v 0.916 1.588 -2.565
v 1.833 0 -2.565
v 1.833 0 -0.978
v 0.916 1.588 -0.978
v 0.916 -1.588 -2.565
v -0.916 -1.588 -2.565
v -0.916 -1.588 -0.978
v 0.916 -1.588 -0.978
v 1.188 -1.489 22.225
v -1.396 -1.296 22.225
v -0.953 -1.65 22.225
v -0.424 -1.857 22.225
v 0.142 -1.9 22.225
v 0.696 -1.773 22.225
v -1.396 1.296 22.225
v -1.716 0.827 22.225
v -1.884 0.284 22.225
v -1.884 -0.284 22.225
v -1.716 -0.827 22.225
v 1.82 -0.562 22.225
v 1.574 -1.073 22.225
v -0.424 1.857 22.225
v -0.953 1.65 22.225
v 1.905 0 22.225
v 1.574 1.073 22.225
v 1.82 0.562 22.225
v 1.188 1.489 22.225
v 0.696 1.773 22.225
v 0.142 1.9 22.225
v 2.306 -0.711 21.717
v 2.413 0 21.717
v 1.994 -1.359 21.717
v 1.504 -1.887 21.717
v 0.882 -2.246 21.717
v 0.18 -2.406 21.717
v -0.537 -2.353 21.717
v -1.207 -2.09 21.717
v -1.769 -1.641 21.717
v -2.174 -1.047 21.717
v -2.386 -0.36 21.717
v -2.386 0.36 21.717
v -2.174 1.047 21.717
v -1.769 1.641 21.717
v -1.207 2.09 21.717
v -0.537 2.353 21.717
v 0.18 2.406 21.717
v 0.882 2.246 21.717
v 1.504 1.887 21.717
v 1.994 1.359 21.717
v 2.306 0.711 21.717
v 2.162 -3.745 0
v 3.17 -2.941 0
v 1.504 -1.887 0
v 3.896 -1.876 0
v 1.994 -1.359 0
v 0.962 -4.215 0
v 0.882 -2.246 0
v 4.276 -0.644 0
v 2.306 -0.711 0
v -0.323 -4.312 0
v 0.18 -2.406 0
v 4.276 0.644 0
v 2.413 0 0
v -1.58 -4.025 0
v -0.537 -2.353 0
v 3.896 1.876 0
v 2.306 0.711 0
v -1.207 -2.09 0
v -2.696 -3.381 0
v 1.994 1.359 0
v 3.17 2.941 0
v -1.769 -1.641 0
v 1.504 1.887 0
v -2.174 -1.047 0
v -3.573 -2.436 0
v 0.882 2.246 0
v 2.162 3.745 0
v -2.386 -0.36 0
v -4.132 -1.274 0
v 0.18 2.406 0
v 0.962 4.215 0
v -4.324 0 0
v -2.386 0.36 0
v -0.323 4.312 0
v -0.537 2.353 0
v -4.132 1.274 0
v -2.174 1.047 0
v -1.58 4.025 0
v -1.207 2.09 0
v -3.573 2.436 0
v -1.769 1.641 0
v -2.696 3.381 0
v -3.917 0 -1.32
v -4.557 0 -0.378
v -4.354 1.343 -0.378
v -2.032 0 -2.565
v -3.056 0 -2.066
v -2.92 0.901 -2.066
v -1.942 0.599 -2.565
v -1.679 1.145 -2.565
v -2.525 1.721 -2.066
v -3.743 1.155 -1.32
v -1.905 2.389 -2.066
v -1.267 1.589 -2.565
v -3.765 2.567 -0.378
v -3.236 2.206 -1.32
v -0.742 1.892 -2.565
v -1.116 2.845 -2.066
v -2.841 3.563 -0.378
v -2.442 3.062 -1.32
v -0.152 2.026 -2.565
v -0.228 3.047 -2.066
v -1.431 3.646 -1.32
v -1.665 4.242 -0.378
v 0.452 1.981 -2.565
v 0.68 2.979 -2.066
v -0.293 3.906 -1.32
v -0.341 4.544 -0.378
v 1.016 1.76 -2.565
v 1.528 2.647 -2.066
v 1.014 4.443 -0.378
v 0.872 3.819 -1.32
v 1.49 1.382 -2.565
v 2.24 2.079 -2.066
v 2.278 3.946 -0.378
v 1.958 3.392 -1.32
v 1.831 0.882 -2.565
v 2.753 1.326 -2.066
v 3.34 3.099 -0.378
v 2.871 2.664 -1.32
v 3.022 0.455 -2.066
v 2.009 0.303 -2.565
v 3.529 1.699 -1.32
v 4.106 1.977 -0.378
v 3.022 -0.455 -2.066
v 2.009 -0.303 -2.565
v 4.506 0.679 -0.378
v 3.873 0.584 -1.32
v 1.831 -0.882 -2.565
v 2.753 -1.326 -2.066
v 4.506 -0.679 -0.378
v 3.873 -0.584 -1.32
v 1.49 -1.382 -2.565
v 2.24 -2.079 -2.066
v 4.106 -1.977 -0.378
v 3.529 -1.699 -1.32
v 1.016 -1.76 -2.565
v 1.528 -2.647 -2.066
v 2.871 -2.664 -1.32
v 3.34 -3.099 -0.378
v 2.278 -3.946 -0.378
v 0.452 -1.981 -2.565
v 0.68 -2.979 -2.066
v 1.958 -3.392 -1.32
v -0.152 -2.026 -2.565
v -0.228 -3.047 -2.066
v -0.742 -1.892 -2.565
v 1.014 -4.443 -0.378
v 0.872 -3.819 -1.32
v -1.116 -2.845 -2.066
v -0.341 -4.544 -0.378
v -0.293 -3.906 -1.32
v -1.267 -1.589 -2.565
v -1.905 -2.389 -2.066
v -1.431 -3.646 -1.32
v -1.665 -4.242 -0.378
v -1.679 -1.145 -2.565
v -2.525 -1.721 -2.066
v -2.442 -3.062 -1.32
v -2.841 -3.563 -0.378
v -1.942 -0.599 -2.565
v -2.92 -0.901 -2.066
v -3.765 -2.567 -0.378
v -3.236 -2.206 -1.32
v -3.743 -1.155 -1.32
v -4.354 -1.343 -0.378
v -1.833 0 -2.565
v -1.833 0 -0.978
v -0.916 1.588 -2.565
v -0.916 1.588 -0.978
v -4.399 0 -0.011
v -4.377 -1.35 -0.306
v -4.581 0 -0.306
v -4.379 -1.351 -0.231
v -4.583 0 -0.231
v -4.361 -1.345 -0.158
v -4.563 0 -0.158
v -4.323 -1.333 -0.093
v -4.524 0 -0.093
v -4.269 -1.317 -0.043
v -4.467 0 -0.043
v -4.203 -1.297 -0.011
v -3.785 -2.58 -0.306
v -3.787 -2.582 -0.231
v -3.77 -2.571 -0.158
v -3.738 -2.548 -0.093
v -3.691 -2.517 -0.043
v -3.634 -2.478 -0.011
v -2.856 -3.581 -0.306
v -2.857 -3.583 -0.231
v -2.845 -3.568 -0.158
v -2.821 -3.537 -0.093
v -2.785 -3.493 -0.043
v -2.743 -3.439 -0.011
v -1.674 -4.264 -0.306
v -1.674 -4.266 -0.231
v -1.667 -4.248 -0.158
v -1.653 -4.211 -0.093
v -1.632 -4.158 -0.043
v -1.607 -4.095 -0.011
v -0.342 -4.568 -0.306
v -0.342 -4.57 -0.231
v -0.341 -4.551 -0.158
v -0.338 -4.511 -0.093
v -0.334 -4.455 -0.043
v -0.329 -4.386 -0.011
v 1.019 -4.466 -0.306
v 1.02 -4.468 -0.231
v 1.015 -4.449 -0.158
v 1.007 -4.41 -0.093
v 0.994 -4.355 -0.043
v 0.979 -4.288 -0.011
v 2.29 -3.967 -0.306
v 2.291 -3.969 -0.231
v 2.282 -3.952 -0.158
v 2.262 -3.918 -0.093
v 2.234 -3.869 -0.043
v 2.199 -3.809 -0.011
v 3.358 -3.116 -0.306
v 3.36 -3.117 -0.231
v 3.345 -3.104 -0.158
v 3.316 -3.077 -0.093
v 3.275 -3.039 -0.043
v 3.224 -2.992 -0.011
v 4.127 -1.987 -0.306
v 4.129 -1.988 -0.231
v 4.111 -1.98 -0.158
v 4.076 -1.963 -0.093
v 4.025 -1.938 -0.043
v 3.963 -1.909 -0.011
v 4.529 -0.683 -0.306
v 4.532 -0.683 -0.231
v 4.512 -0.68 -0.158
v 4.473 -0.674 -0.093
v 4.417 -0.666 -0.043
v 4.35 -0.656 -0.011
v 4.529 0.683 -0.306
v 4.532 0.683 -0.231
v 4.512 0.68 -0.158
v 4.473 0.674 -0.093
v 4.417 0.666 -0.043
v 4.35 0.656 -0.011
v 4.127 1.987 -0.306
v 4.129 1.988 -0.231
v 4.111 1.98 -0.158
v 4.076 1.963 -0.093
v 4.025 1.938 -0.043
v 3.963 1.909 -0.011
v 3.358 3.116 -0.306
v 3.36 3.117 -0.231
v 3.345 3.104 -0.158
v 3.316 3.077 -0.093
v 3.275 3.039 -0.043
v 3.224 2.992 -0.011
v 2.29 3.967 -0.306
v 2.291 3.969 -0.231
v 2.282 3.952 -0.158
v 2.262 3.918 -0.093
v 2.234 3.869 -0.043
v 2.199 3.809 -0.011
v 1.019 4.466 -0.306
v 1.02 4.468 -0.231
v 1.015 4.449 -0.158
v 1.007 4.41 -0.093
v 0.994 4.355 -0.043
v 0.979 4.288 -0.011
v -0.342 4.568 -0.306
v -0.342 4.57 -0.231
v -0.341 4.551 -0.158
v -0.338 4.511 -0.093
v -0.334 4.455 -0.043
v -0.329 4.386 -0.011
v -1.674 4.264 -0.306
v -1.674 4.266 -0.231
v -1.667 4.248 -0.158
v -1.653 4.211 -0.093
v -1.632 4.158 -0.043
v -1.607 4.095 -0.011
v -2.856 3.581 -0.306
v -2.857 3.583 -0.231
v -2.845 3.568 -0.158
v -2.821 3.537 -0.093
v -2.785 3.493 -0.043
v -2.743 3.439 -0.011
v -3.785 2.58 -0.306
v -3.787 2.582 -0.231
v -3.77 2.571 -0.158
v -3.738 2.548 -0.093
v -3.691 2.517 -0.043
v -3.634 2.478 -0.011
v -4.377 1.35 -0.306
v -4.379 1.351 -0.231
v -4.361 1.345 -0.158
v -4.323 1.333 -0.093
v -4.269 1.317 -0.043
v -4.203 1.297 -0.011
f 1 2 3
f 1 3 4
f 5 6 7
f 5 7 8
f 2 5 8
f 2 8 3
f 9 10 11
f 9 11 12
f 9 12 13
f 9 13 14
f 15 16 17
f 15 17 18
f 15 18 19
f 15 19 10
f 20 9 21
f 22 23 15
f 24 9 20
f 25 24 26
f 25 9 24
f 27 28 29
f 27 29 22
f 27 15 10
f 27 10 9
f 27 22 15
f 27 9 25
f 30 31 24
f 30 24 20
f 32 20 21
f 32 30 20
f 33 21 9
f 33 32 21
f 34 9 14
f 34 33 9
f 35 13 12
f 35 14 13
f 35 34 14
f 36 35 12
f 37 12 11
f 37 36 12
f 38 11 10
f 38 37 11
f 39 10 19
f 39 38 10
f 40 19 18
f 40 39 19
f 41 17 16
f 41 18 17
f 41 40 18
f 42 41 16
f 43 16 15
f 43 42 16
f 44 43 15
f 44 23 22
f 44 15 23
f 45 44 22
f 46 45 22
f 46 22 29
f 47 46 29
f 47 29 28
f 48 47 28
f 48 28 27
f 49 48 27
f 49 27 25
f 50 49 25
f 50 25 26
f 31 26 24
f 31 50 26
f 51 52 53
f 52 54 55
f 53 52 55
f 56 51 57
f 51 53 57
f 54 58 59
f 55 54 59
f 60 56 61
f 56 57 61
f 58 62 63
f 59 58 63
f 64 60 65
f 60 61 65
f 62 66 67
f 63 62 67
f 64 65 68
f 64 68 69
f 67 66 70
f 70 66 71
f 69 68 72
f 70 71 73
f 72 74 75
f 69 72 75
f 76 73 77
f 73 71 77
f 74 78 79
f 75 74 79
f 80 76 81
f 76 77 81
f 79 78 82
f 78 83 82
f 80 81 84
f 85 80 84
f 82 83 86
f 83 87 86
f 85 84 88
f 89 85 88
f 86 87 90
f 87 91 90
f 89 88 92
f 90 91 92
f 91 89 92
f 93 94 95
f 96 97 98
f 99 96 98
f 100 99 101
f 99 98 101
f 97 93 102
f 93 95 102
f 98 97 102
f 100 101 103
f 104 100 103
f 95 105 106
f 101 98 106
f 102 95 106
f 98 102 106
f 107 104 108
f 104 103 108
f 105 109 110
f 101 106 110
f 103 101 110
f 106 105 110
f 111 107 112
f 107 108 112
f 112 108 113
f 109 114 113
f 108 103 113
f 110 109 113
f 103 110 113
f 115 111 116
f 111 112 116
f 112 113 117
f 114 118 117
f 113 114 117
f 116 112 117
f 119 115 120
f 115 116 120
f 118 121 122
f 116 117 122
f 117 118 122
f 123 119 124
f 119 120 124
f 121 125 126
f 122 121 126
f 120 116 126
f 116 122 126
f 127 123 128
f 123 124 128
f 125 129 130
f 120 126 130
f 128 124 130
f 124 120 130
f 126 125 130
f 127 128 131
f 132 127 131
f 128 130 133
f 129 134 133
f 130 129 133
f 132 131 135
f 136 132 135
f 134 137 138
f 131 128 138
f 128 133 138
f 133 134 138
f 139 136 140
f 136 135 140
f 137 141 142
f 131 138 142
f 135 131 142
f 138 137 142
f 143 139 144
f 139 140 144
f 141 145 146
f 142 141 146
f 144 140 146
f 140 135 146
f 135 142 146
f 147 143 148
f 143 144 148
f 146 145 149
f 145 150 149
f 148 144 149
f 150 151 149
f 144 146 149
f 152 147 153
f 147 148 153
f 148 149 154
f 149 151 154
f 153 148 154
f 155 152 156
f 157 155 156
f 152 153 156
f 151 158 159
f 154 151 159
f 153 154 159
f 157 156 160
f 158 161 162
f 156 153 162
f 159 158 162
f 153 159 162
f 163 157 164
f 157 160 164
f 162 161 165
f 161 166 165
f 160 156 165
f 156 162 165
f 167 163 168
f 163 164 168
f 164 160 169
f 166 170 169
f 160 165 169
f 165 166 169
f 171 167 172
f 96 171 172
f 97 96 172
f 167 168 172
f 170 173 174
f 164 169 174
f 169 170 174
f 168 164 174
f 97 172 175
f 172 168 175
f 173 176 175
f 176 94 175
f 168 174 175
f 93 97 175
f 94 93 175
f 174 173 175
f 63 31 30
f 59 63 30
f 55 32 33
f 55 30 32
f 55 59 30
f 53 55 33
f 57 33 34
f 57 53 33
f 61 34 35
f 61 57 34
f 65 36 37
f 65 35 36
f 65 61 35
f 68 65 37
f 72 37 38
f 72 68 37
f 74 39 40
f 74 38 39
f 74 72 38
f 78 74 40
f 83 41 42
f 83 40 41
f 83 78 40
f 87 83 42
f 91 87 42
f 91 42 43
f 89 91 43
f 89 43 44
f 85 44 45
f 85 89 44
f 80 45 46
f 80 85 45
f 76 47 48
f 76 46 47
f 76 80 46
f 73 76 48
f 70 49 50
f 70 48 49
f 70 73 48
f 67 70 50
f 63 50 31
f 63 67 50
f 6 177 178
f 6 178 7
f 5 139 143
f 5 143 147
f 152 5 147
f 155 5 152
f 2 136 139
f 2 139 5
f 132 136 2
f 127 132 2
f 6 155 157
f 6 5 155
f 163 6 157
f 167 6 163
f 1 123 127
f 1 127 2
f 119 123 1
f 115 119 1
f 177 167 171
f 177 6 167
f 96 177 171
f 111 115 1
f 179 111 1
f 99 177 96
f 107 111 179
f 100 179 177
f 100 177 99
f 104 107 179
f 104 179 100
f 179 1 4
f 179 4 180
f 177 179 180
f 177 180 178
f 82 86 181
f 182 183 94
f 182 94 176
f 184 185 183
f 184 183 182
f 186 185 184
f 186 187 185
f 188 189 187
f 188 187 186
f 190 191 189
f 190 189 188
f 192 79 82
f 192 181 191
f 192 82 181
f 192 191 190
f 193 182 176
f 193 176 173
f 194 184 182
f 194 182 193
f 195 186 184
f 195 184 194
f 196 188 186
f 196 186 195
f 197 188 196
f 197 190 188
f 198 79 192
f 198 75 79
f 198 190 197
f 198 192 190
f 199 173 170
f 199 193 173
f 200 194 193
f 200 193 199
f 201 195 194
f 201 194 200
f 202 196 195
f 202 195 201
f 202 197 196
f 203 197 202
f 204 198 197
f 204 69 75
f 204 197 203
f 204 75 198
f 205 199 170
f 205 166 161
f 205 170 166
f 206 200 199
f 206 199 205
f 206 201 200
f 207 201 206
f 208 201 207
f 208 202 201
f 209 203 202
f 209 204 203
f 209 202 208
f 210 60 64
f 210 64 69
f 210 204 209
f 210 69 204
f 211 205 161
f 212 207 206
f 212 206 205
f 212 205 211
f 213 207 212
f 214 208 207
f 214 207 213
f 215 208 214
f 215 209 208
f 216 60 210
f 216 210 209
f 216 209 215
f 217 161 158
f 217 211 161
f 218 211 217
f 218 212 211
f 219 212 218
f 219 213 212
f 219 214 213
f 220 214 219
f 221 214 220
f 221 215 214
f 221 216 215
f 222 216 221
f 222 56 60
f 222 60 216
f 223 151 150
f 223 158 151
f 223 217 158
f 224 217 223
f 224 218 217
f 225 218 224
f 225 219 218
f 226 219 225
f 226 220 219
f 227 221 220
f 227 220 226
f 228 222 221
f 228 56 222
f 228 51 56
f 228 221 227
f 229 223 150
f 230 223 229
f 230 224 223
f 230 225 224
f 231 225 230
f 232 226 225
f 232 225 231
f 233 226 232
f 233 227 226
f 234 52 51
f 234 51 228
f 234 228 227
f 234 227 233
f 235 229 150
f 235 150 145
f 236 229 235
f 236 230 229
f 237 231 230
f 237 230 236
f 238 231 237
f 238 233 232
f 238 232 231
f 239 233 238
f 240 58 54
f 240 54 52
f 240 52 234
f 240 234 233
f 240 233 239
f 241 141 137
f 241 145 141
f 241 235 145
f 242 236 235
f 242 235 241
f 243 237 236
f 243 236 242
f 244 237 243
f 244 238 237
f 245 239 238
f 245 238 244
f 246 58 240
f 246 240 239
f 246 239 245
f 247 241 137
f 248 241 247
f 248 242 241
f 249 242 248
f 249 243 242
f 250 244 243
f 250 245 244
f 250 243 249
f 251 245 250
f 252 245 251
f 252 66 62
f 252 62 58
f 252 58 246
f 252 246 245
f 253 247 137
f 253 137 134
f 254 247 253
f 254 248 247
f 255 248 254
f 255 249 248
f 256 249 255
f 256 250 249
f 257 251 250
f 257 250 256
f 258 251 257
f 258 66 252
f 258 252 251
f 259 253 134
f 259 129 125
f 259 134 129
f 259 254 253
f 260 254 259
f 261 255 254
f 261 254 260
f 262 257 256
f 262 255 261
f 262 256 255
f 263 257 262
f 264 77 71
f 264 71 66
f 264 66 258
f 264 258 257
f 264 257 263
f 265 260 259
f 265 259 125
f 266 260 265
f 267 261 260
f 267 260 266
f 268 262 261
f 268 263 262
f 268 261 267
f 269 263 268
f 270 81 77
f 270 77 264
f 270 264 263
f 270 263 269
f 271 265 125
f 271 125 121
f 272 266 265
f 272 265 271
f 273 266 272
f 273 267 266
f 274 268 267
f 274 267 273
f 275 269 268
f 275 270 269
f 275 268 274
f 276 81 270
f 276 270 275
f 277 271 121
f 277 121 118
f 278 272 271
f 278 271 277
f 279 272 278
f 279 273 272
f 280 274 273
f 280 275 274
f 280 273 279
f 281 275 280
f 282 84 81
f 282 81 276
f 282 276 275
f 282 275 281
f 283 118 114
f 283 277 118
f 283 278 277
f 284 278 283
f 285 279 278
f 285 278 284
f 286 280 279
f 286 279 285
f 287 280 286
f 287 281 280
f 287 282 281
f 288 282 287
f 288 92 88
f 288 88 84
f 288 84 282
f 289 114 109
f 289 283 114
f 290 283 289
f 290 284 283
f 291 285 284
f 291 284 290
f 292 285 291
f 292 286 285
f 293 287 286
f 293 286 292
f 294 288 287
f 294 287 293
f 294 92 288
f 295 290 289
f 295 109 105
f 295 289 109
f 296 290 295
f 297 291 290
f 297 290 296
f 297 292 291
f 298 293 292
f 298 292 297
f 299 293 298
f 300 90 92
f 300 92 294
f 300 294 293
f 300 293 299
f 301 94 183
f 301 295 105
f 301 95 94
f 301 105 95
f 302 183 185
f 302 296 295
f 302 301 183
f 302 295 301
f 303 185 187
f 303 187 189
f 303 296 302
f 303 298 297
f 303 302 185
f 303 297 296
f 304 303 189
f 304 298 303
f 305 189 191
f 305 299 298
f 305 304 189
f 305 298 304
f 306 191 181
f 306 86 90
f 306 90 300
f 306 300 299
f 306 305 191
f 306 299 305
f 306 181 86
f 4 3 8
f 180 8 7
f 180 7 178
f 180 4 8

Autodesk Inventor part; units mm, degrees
ref_plane "YZ Plane" through (0, 0, 0) normal (1, 0, 0) x (0, 1, 0)
ref_plane "XZ Plane" through (0, 0, 0) normal (0, 1, 0) x (-1, 0, 0)
ref_plane "XY Plane" through (0, 0, 0) normal (0, 0, 1) x (1, 0, 0)
sketch "Sketch1" plane through (0, 0, 0) normal (0, 0, 1) x (1, 0, 0)
  circle A0 centre (0, 0) radius 2.413
  dimension "d0" = 4.826
extrude "Extrusion1" add sketch "Sketch1" along normal blind 22.225
sketch "Sketch2" plane through (0, 0, 0) normal (0, 1, 0) x (-1, 0, 0)
  line L0 (0, 0) -> (0, -2.5654)
  line L1 (0, 0) -> (4.3239, 0)
  line L2 (0, -2.5654) -> (2.032, -2.5654)
  line L3 (4.3239, 0) -> (4.3239, 3.8864) construction
  arc A0 (4.5568, -0.3781) -> (4.3239, 0) centre (4.3239, -0.2608) ccw
  arc A1 (2.032, -2.5654) -> (4.5568, -0.3781) centre (0.6382, 1.5944) ccw
  line L4 (4.5847, 0.6553) -> (4.5847, -0.2608) construction
  dimension "d3" = 2.5654
  dimension "d6" = 2.032
  dimension "d12" = 4.5847
revolve "Revolution1" add sketch "Sketch2" angle 360 about axis through (0, 0, 0) along (0, 0, -1)
sketch "Sketch3" plane through (0, 0, -2.5654) normal (0, 0, -1) x (-1, 0, 0)
  circle A0 centre (0, 0) radius 2.032 projected
  line L0 (-0.9165, 1.5875) -> (0.9165, 1.5875)
  line L1 (0.9165, 1.5875) -> (1.8331, 0)
  line L2 (1.8331, 0) -> (0.9165, -1.5875)
  line L3 (0.9165, -1.5875) -> (-0.9165, -1.5875)
  line L4 (-0.9165, -1.5875) -> (-1.8331, 0)
  line L5 (-1.8331, 0) -> (-0.9165, 1.5875)
  dimension "d8" = 3.175
extrude "Extrusion2" cut sketch "Sketch3" against normal blind 1.5875 contours L0 L1 L2 L3 L4 L5
chamfer "Chamfer1" distance 0.508 angle 45 1 edges at (-2.413, 0, 22.225)
thread "Thread1" size "10-32 UNF" class "2A" standard "ANSI Unified Screw Threads" full length
properties part number "10-32 x625 button head" material "Steel"
